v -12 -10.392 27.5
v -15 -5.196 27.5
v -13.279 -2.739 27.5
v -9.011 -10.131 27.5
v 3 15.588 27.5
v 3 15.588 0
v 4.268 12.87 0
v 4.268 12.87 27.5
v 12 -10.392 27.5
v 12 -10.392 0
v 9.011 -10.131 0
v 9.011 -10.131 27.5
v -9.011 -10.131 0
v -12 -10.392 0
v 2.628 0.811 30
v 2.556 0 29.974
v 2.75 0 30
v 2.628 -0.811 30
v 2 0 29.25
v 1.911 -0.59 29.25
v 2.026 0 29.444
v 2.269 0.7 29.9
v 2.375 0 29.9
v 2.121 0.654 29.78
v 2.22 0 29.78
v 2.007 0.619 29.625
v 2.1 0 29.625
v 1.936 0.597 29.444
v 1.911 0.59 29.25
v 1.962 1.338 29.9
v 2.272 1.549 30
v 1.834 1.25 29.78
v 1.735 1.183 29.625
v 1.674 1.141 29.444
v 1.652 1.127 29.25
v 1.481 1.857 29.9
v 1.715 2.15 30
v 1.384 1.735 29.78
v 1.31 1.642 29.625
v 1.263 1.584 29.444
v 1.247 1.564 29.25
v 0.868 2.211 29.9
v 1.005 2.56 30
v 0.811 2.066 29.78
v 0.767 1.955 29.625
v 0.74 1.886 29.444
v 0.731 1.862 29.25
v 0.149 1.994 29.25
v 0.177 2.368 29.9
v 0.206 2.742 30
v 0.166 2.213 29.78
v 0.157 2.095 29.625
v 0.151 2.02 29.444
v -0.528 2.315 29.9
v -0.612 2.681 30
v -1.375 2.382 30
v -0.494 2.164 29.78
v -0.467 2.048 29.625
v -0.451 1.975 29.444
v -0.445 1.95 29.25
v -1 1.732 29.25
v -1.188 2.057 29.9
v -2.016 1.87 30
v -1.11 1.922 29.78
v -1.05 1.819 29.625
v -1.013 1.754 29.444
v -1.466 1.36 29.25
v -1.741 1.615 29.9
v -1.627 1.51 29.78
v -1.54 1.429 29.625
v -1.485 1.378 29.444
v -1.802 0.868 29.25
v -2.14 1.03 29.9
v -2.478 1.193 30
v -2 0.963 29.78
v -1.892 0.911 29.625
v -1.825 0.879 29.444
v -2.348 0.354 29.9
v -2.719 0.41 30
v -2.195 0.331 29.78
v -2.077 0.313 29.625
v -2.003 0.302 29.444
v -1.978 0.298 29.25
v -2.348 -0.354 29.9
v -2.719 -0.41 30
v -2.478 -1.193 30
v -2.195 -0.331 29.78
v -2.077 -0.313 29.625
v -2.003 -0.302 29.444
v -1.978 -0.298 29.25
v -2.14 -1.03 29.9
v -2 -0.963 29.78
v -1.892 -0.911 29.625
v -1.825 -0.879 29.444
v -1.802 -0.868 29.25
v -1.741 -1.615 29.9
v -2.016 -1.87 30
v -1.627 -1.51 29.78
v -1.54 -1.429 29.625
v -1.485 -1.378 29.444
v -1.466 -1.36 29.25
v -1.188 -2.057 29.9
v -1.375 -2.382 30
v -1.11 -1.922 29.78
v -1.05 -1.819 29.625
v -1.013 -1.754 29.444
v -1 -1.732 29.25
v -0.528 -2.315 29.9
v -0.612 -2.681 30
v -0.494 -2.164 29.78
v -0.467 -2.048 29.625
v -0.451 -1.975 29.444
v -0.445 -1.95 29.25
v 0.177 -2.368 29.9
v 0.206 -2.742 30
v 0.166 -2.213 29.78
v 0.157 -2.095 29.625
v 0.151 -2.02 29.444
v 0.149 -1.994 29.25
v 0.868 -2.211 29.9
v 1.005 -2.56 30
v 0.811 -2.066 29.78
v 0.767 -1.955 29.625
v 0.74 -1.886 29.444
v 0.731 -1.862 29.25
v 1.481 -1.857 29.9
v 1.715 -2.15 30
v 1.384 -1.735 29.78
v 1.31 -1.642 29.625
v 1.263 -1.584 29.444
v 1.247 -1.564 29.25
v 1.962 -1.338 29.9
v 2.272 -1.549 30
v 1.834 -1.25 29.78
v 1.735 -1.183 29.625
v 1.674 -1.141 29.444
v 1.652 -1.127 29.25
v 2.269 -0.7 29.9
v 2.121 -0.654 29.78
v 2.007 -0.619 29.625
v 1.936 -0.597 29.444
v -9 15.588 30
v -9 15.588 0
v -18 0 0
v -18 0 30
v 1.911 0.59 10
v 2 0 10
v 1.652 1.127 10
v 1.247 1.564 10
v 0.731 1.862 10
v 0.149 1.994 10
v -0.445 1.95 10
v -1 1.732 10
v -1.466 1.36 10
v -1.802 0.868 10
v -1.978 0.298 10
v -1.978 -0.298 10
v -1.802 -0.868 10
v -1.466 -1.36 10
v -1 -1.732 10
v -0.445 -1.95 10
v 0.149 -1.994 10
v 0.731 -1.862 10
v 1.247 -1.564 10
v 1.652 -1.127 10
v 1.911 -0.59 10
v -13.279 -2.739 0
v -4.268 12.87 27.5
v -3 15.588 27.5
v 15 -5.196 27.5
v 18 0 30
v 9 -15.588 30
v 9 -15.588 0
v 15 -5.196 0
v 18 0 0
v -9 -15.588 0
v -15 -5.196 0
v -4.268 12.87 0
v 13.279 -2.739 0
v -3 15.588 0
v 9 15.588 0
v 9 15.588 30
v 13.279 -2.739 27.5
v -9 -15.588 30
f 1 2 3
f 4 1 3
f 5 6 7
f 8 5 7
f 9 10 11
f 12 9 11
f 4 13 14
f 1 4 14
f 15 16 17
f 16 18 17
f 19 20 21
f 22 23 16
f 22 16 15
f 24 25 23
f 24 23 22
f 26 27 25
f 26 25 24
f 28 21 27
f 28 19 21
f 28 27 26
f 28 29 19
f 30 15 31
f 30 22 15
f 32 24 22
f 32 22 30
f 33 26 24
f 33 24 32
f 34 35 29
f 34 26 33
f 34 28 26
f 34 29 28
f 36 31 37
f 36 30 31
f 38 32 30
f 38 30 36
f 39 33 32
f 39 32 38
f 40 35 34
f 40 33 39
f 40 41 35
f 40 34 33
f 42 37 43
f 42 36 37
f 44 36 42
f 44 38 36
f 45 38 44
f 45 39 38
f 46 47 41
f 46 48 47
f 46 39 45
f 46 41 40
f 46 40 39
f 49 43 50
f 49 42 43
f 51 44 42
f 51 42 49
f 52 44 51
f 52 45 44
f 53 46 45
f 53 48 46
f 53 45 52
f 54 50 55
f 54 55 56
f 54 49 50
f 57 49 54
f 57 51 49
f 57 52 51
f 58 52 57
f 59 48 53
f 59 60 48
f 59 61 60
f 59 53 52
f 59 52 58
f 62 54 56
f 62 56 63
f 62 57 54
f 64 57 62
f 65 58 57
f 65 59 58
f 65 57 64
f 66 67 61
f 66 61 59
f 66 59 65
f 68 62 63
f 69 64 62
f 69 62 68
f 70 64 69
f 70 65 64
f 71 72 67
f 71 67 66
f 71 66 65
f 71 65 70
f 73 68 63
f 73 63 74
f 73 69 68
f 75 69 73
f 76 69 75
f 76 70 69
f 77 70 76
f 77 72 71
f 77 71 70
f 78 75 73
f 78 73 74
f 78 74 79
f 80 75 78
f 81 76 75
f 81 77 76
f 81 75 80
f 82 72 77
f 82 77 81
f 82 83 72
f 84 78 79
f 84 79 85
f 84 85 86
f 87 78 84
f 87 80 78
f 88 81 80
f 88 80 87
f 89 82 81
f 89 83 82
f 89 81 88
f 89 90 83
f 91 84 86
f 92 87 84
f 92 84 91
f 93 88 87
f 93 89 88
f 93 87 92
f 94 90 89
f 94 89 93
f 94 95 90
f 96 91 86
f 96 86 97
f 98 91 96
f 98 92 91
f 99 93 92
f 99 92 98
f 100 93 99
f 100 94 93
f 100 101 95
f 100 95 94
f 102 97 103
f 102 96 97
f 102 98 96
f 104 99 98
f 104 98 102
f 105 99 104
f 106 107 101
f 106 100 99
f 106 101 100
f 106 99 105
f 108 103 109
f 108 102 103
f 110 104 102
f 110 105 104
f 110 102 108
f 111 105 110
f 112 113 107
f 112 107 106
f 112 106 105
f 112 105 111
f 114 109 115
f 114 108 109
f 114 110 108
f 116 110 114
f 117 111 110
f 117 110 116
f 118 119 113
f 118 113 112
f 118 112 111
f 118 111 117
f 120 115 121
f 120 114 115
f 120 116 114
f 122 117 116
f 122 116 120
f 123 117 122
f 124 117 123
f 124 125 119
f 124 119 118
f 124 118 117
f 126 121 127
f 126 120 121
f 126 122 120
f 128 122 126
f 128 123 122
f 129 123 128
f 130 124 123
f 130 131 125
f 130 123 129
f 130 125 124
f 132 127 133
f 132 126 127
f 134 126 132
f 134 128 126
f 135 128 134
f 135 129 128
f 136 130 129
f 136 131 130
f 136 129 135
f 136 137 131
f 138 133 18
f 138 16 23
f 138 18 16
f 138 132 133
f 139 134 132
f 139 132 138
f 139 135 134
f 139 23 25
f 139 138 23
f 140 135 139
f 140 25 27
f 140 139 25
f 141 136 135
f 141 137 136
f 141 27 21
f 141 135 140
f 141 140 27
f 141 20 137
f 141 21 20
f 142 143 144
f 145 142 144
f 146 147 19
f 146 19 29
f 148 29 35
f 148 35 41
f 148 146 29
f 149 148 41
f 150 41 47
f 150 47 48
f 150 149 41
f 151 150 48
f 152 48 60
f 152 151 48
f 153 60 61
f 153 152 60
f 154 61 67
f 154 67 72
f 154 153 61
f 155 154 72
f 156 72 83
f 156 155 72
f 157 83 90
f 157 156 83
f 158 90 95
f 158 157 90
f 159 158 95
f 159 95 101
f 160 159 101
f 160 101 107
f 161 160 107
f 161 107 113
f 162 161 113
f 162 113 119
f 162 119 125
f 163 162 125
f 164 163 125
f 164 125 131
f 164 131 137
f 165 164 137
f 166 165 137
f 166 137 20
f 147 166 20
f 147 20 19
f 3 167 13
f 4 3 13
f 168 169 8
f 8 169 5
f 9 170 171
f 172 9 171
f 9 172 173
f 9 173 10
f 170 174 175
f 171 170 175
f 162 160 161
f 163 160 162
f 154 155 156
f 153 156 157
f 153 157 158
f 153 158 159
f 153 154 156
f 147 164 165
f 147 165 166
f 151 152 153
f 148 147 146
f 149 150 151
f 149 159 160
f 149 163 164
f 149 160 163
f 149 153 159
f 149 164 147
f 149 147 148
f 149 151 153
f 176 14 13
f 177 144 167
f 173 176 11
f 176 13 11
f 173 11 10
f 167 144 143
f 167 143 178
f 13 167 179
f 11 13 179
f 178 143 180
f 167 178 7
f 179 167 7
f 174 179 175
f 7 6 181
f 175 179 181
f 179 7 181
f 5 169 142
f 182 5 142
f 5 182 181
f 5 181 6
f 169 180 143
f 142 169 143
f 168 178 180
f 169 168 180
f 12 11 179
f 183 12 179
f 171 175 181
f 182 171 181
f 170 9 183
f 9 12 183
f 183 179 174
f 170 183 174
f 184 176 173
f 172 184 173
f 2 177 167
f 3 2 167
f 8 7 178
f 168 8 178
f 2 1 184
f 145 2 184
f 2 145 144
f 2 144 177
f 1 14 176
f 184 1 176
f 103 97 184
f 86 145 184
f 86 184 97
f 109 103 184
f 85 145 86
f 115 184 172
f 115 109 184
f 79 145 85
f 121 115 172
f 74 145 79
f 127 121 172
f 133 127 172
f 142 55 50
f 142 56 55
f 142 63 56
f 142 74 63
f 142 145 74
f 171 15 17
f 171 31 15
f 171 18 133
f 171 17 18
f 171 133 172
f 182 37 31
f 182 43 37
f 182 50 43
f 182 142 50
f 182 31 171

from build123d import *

# Parameters (mm, degrees)
F0_R     = 2
F1_DEPTH = 10
F2_DEPTH = 30
F3_START = 27.5
F3_DEPTH = 2.5
F4_R     = 0.75


with BuildPart() as f1:
    # F0 (on Top) → F1 (new body)
    with BuildSketch(Plane.XY):
        Circle(F0_R)
    extrude(amount=F1_DEPTH)

    # F0 (on Top) → F2 (join)
    with BuildSketch(Plane.XY):
        Polygon((-3, 15.5884572681), (-9, 15.5884572681), (-18, 0), (-15, -5.1961524227), (-13.2792706909, -2.7386962898), (-9.0114159057, -10.1308376172), (-12, -10.3923048454), (-9, -15.5884572681), (9, -15.5884572681), (12, -10.3923048454), (9.0114159057, -10.1308376172), (13.2792706909, -2.7386962898), (15, -5.1961524227), (18, 0), (9, 15.5884572681), (3, 15.5884572681), (4.2678547852, 12.869533907), (-4.2678547852, 12.869533907), align=None)
        Circle(F0_R, mode=Mode.SUBTRACT)
    extrude(amount=F2_DEPTH)

    # F0 (on Top) → F3 (join)
    with BuildSketch(Plane.XY.offset(F3_START)):
        Polygon((3, 15.5884572681), (-3, 15.5884572681), (-4.2678547852, 12.869533907), (4.2678547852, 12.869533907), align=None)
        Polygon((-13.2792706909, -2.7386962898), (-15, -5.1961524227), (-12, -10.3923048454), (-9.0114159057, -10.1308376172), align=None)
        Polygon((12, -10.3923048454), (15, -5.1961524227), (13.2792706909, -2.7386962898), (9.0114159057, -10.1308376172), align=None)
    extrude(amount=F3_DEPTH)

    # F4
    f4_edges = [f1.edges().sort_by_distance(p)[0] for p in [
        (-2, 0, 30),
    ]]
    fillet(f4_edges, radius=F4_R)


solid = f1.part
